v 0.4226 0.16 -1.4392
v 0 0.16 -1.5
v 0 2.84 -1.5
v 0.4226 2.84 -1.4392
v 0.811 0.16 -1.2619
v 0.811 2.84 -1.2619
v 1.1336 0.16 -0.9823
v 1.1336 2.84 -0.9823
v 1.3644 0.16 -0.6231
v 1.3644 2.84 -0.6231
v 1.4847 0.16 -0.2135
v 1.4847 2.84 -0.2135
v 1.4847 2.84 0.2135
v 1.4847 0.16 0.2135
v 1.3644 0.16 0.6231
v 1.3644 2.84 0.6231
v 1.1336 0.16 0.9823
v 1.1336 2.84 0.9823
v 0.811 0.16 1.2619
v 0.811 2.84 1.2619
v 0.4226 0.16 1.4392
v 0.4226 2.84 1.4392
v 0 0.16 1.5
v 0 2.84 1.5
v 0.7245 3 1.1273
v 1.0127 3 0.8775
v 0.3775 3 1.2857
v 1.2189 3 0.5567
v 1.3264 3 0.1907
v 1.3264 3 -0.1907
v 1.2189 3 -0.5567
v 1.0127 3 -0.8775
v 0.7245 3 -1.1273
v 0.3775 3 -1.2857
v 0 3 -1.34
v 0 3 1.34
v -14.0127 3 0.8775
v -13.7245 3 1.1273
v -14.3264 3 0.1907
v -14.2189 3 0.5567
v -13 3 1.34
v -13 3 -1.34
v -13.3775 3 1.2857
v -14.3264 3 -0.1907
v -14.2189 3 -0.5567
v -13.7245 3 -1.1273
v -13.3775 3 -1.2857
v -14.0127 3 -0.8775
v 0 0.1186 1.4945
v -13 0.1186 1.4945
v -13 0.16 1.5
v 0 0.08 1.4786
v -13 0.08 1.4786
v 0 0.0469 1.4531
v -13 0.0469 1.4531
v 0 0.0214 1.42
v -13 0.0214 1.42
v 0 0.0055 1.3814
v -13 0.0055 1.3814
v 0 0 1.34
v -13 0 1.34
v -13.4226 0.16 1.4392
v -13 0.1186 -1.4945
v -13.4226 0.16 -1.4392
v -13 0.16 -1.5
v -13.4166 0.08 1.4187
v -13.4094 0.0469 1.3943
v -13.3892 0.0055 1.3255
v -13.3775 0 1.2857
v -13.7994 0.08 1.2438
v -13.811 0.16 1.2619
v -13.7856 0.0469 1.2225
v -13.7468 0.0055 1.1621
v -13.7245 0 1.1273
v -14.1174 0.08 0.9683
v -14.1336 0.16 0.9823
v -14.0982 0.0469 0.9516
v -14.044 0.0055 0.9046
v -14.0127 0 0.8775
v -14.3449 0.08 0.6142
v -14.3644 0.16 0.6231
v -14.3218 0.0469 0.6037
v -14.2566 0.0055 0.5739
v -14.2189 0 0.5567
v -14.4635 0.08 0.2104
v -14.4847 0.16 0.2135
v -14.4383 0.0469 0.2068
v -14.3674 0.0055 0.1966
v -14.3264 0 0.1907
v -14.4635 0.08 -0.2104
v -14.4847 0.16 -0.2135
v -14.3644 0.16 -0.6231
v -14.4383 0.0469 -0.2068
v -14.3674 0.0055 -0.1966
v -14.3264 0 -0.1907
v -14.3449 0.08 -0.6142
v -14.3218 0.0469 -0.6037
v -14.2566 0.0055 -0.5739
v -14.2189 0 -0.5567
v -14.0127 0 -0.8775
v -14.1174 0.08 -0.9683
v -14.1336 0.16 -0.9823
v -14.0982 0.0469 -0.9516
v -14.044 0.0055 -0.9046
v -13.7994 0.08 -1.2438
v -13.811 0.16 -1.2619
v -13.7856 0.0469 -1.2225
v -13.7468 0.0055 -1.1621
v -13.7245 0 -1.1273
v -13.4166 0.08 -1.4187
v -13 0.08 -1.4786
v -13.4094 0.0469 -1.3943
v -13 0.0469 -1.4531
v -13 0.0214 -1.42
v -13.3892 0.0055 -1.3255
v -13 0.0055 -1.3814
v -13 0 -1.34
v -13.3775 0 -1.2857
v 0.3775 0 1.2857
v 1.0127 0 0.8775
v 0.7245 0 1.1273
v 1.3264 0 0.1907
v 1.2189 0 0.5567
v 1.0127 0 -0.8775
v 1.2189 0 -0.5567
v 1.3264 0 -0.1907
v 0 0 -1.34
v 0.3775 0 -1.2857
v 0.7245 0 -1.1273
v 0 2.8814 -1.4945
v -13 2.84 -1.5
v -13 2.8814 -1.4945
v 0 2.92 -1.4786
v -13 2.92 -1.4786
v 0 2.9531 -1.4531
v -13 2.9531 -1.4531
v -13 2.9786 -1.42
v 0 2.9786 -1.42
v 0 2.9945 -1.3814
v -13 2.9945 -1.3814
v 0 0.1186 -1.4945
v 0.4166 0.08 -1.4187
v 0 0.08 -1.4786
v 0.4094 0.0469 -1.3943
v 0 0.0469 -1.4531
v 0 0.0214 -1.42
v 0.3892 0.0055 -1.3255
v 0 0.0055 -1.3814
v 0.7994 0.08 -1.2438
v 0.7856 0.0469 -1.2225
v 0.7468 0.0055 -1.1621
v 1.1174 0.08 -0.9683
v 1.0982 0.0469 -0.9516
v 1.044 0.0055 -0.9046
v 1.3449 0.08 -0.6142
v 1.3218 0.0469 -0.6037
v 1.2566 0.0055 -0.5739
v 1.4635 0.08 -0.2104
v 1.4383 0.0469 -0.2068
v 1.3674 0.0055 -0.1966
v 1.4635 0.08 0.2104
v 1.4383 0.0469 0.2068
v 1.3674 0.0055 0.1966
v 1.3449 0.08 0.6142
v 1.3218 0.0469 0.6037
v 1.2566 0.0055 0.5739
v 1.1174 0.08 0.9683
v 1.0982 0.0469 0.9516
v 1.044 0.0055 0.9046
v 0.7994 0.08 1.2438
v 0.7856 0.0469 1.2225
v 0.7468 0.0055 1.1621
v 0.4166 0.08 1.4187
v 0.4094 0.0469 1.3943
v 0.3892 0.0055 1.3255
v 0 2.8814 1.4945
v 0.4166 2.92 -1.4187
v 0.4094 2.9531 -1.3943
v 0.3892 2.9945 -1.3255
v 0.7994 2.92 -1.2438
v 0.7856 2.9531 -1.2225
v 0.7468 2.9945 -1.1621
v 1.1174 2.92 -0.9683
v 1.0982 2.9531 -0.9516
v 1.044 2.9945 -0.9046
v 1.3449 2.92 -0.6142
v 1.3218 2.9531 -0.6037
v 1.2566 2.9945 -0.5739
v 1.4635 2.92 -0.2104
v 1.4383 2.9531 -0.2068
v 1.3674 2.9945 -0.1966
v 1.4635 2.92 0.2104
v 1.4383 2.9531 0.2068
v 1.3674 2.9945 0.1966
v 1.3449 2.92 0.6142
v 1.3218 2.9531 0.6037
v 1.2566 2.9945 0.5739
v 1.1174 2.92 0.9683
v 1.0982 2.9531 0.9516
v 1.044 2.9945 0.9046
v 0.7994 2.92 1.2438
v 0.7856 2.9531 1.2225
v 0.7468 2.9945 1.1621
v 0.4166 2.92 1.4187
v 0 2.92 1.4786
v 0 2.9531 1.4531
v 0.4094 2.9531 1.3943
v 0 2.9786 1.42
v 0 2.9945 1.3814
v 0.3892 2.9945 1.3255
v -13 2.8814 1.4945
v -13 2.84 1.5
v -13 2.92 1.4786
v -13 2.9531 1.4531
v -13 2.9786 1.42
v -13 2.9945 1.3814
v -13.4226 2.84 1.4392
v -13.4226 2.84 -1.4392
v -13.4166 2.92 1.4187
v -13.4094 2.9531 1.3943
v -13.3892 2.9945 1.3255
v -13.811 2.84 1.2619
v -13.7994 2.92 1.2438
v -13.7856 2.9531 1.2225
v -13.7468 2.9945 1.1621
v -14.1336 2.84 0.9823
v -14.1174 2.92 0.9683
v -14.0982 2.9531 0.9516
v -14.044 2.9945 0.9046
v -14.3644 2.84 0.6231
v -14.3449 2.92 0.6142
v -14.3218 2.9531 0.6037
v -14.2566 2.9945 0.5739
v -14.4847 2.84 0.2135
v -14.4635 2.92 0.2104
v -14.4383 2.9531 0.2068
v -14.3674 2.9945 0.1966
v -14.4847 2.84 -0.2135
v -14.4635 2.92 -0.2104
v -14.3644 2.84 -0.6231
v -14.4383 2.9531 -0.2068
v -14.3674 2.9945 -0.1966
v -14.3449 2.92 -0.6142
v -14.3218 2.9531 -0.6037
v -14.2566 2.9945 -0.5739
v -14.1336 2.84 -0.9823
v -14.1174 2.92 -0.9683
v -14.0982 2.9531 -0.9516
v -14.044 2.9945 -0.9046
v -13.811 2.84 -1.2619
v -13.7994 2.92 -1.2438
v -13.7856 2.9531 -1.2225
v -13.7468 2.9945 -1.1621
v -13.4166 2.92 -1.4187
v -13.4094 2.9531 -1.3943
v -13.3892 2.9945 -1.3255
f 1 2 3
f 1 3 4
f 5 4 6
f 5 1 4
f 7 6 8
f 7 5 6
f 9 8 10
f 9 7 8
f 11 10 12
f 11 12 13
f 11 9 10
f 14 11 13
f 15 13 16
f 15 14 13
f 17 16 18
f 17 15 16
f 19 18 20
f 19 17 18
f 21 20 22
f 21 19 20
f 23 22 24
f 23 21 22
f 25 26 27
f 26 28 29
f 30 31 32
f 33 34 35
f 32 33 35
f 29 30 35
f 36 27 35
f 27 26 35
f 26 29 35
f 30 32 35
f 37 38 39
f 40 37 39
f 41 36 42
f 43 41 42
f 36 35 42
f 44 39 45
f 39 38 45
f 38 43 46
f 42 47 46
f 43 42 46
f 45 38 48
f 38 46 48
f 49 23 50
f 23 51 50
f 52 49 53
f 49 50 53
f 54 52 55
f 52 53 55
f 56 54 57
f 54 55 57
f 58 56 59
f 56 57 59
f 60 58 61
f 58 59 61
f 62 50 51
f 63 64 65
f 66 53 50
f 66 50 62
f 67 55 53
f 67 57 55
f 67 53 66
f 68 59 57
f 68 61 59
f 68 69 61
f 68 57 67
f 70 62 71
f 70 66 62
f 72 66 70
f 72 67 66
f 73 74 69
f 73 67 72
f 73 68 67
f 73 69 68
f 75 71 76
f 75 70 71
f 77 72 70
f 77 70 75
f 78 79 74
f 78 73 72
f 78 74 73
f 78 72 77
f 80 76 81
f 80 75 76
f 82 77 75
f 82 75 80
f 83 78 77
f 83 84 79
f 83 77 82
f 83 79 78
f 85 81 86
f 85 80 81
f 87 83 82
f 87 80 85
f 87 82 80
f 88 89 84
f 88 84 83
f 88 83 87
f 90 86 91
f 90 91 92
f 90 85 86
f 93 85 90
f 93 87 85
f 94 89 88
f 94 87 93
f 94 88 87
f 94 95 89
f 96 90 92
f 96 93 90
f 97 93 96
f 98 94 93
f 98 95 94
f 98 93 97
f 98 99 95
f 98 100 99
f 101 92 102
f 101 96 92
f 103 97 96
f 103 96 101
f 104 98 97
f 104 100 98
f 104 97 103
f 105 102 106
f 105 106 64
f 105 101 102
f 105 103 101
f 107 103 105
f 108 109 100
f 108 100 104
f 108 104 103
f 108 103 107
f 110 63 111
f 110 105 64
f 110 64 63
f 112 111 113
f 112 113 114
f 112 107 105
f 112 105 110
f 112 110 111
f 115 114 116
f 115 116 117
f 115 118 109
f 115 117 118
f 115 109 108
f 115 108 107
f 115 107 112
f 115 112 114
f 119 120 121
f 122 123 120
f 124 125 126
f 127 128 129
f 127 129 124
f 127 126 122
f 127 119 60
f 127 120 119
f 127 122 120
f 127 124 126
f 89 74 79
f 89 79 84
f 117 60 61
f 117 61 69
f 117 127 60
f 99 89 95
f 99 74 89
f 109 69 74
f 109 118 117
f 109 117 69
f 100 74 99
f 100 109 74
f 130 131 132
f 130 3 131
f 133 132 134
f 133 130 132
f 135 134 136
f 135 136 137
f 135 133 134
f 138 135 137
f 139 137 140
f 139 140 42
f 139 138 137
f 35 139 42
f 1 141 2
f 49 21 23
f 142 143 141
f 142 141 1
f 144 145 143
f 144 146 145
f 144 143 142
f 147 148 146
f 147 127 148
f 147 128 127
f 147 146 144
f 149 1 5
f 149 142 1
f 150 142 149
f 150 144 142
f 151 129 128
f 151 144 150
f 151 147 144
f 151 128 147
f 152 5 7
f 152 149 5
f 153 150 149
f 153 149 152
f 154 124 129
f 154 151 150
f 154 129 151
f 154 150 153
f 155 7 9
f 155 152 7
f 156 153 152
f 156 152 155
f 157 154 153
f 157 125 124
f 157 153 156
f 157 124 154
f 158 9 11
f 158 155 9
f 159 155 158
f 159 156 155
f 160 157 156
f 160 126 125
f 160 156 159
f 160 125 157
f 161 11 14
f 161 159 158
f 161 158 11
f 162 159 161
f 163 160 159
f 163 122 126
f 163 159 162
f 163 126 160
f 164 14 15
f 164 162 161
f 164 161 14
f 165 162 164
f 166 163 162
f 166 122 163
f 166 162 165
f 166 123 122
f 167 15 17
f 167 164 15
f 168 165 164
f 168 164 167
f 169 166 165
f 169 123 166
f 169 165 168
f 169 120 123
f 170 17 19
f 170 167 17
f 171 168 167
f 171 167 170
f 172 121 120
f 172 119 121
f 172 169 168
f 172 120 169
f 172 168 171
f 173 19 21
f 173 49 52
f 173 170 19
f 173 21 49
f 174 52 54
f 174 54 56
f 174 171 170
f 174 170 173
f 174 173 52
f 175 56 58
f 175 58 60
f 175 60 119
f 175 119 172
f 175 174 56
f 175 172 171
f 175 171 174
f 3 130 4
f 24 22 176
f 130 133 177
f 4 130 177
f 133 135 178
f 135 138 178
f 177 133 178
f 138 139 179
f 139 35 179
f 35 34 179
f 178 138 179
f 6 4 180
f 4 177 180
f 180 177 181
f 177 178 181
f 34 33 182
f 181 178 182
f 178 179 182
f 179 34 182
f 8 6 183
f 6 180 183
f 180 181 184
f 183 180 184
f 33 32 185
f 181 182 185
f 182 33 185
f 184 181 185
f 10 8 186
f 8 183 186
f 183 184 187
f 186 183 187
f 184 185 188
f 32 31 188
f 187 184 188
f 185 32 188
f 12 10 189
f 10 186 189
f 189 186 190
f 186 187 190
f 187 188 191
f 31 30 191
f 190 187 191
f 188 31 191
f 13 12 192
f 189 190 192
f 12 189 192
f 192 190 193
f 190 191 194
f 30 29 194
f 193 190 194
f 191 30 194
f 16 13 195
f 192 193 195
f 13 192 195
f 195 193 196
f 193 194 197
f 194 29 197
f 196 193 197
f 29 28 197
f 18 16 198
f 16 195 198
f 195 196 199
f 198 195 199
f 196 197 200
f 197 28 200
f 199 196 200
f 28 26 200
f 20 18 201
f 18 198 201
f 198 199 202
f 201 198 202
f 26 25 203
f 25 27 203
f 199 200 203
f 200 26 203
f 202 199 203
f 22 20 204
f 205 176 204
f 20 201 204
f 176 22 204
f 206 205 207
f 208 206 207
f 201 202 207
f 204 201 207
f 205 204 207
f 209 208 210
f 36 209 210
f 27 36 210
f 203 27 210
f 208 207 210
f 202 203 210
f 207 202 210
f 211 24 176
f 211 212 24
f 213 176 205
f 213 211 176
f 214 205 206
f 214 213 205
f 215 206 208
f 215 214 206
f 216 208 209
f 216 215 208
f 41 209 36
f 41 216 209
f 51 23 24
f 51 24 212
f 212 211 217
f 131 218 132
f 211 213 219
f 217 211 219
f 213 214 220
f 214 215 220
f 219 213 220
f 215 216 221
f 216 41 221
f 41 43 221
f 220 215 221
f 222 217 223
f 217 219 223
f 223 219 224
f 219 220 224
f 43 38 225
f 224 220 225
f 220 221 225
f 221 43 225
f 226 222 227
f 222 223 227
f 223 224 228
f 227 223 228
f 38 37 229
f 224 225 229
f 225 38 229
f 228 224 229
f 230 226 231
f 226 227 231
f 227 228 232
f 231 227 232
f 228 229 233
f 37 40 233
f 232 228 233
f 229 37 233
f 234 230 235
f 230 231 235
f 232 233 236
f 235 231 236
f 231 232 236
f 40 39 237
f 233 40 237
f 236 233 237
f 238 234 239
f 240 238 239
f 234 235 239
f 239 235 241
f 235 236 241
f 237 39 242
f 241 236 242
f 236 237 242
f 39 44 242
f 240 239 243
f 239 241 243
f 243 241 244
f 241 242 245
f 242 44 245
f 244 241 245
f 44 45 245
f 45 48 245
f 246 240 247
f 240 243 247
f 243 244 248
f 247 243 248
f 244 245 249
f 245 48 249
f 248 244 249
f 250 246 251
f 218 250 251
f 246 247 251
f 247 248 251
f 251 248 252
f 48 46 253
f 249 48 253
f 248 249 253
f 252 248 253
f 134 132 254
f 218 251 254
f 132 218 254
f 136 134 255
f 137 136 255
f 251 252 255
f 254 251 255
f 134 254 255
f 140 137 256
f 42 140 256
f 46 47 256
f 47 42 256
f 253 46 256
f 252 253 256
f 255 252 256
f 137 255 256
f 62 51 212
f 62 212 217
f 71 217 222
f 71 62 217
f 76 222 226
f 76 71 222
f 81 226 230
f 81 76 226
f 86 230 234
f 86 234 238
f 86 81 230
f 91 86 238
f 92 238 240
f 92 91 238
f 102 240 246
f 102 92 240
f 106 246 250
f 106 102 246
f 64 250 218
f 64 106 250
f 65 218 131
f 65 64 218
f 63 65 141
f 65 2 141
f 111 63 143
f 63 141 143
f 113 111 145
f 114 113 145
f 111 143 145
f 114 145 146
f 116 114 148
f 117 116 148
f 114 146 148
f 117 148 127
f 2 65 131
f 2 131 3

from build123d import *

# Parameters (mm, degrees)
EXTRUDE1_DEPTH = 3
FILLET1_R      = 0.16


with BuildPart() as part:
    # Sketch1 → Extrude1 (new body)
    with BuildSketch(Plane(origin=(0, 0, 0), x_dir=(1, 0, 0), z_dir=(0, 1, 0))):
        with BuildLine():
            Line((-13, 1.5), (0, 1.5))
            ThreePointArc((0, 1.5), (1.5, 0), (0, -1.5))
            Line((0, -1.5), (-13, -1.5))
            ThreePointArc((-13, -1.5), (-14.5, 0), (-13, 1.5))
        make_face()
    extrude(amount=EXTRUDE1_DEPTH)

    # Fillet1
    fillet1_edges = [part.edges().sort_by_distance(p)[0] for p in [
        (1.5, 3, 0),
        (-6.5, 3, -1.5),
        (-14.5, 3, 0),
        (-6.5, 0, -1.5),
        (1.5, 0, 0),
        (-6.5, 0, 1.5),
        (-14.5, 0, 0),
        (-6.5, 3, 1.5),
    ]]
    fillet(fillet1_edges, radius=FILLET1_R)


solid = part.part
